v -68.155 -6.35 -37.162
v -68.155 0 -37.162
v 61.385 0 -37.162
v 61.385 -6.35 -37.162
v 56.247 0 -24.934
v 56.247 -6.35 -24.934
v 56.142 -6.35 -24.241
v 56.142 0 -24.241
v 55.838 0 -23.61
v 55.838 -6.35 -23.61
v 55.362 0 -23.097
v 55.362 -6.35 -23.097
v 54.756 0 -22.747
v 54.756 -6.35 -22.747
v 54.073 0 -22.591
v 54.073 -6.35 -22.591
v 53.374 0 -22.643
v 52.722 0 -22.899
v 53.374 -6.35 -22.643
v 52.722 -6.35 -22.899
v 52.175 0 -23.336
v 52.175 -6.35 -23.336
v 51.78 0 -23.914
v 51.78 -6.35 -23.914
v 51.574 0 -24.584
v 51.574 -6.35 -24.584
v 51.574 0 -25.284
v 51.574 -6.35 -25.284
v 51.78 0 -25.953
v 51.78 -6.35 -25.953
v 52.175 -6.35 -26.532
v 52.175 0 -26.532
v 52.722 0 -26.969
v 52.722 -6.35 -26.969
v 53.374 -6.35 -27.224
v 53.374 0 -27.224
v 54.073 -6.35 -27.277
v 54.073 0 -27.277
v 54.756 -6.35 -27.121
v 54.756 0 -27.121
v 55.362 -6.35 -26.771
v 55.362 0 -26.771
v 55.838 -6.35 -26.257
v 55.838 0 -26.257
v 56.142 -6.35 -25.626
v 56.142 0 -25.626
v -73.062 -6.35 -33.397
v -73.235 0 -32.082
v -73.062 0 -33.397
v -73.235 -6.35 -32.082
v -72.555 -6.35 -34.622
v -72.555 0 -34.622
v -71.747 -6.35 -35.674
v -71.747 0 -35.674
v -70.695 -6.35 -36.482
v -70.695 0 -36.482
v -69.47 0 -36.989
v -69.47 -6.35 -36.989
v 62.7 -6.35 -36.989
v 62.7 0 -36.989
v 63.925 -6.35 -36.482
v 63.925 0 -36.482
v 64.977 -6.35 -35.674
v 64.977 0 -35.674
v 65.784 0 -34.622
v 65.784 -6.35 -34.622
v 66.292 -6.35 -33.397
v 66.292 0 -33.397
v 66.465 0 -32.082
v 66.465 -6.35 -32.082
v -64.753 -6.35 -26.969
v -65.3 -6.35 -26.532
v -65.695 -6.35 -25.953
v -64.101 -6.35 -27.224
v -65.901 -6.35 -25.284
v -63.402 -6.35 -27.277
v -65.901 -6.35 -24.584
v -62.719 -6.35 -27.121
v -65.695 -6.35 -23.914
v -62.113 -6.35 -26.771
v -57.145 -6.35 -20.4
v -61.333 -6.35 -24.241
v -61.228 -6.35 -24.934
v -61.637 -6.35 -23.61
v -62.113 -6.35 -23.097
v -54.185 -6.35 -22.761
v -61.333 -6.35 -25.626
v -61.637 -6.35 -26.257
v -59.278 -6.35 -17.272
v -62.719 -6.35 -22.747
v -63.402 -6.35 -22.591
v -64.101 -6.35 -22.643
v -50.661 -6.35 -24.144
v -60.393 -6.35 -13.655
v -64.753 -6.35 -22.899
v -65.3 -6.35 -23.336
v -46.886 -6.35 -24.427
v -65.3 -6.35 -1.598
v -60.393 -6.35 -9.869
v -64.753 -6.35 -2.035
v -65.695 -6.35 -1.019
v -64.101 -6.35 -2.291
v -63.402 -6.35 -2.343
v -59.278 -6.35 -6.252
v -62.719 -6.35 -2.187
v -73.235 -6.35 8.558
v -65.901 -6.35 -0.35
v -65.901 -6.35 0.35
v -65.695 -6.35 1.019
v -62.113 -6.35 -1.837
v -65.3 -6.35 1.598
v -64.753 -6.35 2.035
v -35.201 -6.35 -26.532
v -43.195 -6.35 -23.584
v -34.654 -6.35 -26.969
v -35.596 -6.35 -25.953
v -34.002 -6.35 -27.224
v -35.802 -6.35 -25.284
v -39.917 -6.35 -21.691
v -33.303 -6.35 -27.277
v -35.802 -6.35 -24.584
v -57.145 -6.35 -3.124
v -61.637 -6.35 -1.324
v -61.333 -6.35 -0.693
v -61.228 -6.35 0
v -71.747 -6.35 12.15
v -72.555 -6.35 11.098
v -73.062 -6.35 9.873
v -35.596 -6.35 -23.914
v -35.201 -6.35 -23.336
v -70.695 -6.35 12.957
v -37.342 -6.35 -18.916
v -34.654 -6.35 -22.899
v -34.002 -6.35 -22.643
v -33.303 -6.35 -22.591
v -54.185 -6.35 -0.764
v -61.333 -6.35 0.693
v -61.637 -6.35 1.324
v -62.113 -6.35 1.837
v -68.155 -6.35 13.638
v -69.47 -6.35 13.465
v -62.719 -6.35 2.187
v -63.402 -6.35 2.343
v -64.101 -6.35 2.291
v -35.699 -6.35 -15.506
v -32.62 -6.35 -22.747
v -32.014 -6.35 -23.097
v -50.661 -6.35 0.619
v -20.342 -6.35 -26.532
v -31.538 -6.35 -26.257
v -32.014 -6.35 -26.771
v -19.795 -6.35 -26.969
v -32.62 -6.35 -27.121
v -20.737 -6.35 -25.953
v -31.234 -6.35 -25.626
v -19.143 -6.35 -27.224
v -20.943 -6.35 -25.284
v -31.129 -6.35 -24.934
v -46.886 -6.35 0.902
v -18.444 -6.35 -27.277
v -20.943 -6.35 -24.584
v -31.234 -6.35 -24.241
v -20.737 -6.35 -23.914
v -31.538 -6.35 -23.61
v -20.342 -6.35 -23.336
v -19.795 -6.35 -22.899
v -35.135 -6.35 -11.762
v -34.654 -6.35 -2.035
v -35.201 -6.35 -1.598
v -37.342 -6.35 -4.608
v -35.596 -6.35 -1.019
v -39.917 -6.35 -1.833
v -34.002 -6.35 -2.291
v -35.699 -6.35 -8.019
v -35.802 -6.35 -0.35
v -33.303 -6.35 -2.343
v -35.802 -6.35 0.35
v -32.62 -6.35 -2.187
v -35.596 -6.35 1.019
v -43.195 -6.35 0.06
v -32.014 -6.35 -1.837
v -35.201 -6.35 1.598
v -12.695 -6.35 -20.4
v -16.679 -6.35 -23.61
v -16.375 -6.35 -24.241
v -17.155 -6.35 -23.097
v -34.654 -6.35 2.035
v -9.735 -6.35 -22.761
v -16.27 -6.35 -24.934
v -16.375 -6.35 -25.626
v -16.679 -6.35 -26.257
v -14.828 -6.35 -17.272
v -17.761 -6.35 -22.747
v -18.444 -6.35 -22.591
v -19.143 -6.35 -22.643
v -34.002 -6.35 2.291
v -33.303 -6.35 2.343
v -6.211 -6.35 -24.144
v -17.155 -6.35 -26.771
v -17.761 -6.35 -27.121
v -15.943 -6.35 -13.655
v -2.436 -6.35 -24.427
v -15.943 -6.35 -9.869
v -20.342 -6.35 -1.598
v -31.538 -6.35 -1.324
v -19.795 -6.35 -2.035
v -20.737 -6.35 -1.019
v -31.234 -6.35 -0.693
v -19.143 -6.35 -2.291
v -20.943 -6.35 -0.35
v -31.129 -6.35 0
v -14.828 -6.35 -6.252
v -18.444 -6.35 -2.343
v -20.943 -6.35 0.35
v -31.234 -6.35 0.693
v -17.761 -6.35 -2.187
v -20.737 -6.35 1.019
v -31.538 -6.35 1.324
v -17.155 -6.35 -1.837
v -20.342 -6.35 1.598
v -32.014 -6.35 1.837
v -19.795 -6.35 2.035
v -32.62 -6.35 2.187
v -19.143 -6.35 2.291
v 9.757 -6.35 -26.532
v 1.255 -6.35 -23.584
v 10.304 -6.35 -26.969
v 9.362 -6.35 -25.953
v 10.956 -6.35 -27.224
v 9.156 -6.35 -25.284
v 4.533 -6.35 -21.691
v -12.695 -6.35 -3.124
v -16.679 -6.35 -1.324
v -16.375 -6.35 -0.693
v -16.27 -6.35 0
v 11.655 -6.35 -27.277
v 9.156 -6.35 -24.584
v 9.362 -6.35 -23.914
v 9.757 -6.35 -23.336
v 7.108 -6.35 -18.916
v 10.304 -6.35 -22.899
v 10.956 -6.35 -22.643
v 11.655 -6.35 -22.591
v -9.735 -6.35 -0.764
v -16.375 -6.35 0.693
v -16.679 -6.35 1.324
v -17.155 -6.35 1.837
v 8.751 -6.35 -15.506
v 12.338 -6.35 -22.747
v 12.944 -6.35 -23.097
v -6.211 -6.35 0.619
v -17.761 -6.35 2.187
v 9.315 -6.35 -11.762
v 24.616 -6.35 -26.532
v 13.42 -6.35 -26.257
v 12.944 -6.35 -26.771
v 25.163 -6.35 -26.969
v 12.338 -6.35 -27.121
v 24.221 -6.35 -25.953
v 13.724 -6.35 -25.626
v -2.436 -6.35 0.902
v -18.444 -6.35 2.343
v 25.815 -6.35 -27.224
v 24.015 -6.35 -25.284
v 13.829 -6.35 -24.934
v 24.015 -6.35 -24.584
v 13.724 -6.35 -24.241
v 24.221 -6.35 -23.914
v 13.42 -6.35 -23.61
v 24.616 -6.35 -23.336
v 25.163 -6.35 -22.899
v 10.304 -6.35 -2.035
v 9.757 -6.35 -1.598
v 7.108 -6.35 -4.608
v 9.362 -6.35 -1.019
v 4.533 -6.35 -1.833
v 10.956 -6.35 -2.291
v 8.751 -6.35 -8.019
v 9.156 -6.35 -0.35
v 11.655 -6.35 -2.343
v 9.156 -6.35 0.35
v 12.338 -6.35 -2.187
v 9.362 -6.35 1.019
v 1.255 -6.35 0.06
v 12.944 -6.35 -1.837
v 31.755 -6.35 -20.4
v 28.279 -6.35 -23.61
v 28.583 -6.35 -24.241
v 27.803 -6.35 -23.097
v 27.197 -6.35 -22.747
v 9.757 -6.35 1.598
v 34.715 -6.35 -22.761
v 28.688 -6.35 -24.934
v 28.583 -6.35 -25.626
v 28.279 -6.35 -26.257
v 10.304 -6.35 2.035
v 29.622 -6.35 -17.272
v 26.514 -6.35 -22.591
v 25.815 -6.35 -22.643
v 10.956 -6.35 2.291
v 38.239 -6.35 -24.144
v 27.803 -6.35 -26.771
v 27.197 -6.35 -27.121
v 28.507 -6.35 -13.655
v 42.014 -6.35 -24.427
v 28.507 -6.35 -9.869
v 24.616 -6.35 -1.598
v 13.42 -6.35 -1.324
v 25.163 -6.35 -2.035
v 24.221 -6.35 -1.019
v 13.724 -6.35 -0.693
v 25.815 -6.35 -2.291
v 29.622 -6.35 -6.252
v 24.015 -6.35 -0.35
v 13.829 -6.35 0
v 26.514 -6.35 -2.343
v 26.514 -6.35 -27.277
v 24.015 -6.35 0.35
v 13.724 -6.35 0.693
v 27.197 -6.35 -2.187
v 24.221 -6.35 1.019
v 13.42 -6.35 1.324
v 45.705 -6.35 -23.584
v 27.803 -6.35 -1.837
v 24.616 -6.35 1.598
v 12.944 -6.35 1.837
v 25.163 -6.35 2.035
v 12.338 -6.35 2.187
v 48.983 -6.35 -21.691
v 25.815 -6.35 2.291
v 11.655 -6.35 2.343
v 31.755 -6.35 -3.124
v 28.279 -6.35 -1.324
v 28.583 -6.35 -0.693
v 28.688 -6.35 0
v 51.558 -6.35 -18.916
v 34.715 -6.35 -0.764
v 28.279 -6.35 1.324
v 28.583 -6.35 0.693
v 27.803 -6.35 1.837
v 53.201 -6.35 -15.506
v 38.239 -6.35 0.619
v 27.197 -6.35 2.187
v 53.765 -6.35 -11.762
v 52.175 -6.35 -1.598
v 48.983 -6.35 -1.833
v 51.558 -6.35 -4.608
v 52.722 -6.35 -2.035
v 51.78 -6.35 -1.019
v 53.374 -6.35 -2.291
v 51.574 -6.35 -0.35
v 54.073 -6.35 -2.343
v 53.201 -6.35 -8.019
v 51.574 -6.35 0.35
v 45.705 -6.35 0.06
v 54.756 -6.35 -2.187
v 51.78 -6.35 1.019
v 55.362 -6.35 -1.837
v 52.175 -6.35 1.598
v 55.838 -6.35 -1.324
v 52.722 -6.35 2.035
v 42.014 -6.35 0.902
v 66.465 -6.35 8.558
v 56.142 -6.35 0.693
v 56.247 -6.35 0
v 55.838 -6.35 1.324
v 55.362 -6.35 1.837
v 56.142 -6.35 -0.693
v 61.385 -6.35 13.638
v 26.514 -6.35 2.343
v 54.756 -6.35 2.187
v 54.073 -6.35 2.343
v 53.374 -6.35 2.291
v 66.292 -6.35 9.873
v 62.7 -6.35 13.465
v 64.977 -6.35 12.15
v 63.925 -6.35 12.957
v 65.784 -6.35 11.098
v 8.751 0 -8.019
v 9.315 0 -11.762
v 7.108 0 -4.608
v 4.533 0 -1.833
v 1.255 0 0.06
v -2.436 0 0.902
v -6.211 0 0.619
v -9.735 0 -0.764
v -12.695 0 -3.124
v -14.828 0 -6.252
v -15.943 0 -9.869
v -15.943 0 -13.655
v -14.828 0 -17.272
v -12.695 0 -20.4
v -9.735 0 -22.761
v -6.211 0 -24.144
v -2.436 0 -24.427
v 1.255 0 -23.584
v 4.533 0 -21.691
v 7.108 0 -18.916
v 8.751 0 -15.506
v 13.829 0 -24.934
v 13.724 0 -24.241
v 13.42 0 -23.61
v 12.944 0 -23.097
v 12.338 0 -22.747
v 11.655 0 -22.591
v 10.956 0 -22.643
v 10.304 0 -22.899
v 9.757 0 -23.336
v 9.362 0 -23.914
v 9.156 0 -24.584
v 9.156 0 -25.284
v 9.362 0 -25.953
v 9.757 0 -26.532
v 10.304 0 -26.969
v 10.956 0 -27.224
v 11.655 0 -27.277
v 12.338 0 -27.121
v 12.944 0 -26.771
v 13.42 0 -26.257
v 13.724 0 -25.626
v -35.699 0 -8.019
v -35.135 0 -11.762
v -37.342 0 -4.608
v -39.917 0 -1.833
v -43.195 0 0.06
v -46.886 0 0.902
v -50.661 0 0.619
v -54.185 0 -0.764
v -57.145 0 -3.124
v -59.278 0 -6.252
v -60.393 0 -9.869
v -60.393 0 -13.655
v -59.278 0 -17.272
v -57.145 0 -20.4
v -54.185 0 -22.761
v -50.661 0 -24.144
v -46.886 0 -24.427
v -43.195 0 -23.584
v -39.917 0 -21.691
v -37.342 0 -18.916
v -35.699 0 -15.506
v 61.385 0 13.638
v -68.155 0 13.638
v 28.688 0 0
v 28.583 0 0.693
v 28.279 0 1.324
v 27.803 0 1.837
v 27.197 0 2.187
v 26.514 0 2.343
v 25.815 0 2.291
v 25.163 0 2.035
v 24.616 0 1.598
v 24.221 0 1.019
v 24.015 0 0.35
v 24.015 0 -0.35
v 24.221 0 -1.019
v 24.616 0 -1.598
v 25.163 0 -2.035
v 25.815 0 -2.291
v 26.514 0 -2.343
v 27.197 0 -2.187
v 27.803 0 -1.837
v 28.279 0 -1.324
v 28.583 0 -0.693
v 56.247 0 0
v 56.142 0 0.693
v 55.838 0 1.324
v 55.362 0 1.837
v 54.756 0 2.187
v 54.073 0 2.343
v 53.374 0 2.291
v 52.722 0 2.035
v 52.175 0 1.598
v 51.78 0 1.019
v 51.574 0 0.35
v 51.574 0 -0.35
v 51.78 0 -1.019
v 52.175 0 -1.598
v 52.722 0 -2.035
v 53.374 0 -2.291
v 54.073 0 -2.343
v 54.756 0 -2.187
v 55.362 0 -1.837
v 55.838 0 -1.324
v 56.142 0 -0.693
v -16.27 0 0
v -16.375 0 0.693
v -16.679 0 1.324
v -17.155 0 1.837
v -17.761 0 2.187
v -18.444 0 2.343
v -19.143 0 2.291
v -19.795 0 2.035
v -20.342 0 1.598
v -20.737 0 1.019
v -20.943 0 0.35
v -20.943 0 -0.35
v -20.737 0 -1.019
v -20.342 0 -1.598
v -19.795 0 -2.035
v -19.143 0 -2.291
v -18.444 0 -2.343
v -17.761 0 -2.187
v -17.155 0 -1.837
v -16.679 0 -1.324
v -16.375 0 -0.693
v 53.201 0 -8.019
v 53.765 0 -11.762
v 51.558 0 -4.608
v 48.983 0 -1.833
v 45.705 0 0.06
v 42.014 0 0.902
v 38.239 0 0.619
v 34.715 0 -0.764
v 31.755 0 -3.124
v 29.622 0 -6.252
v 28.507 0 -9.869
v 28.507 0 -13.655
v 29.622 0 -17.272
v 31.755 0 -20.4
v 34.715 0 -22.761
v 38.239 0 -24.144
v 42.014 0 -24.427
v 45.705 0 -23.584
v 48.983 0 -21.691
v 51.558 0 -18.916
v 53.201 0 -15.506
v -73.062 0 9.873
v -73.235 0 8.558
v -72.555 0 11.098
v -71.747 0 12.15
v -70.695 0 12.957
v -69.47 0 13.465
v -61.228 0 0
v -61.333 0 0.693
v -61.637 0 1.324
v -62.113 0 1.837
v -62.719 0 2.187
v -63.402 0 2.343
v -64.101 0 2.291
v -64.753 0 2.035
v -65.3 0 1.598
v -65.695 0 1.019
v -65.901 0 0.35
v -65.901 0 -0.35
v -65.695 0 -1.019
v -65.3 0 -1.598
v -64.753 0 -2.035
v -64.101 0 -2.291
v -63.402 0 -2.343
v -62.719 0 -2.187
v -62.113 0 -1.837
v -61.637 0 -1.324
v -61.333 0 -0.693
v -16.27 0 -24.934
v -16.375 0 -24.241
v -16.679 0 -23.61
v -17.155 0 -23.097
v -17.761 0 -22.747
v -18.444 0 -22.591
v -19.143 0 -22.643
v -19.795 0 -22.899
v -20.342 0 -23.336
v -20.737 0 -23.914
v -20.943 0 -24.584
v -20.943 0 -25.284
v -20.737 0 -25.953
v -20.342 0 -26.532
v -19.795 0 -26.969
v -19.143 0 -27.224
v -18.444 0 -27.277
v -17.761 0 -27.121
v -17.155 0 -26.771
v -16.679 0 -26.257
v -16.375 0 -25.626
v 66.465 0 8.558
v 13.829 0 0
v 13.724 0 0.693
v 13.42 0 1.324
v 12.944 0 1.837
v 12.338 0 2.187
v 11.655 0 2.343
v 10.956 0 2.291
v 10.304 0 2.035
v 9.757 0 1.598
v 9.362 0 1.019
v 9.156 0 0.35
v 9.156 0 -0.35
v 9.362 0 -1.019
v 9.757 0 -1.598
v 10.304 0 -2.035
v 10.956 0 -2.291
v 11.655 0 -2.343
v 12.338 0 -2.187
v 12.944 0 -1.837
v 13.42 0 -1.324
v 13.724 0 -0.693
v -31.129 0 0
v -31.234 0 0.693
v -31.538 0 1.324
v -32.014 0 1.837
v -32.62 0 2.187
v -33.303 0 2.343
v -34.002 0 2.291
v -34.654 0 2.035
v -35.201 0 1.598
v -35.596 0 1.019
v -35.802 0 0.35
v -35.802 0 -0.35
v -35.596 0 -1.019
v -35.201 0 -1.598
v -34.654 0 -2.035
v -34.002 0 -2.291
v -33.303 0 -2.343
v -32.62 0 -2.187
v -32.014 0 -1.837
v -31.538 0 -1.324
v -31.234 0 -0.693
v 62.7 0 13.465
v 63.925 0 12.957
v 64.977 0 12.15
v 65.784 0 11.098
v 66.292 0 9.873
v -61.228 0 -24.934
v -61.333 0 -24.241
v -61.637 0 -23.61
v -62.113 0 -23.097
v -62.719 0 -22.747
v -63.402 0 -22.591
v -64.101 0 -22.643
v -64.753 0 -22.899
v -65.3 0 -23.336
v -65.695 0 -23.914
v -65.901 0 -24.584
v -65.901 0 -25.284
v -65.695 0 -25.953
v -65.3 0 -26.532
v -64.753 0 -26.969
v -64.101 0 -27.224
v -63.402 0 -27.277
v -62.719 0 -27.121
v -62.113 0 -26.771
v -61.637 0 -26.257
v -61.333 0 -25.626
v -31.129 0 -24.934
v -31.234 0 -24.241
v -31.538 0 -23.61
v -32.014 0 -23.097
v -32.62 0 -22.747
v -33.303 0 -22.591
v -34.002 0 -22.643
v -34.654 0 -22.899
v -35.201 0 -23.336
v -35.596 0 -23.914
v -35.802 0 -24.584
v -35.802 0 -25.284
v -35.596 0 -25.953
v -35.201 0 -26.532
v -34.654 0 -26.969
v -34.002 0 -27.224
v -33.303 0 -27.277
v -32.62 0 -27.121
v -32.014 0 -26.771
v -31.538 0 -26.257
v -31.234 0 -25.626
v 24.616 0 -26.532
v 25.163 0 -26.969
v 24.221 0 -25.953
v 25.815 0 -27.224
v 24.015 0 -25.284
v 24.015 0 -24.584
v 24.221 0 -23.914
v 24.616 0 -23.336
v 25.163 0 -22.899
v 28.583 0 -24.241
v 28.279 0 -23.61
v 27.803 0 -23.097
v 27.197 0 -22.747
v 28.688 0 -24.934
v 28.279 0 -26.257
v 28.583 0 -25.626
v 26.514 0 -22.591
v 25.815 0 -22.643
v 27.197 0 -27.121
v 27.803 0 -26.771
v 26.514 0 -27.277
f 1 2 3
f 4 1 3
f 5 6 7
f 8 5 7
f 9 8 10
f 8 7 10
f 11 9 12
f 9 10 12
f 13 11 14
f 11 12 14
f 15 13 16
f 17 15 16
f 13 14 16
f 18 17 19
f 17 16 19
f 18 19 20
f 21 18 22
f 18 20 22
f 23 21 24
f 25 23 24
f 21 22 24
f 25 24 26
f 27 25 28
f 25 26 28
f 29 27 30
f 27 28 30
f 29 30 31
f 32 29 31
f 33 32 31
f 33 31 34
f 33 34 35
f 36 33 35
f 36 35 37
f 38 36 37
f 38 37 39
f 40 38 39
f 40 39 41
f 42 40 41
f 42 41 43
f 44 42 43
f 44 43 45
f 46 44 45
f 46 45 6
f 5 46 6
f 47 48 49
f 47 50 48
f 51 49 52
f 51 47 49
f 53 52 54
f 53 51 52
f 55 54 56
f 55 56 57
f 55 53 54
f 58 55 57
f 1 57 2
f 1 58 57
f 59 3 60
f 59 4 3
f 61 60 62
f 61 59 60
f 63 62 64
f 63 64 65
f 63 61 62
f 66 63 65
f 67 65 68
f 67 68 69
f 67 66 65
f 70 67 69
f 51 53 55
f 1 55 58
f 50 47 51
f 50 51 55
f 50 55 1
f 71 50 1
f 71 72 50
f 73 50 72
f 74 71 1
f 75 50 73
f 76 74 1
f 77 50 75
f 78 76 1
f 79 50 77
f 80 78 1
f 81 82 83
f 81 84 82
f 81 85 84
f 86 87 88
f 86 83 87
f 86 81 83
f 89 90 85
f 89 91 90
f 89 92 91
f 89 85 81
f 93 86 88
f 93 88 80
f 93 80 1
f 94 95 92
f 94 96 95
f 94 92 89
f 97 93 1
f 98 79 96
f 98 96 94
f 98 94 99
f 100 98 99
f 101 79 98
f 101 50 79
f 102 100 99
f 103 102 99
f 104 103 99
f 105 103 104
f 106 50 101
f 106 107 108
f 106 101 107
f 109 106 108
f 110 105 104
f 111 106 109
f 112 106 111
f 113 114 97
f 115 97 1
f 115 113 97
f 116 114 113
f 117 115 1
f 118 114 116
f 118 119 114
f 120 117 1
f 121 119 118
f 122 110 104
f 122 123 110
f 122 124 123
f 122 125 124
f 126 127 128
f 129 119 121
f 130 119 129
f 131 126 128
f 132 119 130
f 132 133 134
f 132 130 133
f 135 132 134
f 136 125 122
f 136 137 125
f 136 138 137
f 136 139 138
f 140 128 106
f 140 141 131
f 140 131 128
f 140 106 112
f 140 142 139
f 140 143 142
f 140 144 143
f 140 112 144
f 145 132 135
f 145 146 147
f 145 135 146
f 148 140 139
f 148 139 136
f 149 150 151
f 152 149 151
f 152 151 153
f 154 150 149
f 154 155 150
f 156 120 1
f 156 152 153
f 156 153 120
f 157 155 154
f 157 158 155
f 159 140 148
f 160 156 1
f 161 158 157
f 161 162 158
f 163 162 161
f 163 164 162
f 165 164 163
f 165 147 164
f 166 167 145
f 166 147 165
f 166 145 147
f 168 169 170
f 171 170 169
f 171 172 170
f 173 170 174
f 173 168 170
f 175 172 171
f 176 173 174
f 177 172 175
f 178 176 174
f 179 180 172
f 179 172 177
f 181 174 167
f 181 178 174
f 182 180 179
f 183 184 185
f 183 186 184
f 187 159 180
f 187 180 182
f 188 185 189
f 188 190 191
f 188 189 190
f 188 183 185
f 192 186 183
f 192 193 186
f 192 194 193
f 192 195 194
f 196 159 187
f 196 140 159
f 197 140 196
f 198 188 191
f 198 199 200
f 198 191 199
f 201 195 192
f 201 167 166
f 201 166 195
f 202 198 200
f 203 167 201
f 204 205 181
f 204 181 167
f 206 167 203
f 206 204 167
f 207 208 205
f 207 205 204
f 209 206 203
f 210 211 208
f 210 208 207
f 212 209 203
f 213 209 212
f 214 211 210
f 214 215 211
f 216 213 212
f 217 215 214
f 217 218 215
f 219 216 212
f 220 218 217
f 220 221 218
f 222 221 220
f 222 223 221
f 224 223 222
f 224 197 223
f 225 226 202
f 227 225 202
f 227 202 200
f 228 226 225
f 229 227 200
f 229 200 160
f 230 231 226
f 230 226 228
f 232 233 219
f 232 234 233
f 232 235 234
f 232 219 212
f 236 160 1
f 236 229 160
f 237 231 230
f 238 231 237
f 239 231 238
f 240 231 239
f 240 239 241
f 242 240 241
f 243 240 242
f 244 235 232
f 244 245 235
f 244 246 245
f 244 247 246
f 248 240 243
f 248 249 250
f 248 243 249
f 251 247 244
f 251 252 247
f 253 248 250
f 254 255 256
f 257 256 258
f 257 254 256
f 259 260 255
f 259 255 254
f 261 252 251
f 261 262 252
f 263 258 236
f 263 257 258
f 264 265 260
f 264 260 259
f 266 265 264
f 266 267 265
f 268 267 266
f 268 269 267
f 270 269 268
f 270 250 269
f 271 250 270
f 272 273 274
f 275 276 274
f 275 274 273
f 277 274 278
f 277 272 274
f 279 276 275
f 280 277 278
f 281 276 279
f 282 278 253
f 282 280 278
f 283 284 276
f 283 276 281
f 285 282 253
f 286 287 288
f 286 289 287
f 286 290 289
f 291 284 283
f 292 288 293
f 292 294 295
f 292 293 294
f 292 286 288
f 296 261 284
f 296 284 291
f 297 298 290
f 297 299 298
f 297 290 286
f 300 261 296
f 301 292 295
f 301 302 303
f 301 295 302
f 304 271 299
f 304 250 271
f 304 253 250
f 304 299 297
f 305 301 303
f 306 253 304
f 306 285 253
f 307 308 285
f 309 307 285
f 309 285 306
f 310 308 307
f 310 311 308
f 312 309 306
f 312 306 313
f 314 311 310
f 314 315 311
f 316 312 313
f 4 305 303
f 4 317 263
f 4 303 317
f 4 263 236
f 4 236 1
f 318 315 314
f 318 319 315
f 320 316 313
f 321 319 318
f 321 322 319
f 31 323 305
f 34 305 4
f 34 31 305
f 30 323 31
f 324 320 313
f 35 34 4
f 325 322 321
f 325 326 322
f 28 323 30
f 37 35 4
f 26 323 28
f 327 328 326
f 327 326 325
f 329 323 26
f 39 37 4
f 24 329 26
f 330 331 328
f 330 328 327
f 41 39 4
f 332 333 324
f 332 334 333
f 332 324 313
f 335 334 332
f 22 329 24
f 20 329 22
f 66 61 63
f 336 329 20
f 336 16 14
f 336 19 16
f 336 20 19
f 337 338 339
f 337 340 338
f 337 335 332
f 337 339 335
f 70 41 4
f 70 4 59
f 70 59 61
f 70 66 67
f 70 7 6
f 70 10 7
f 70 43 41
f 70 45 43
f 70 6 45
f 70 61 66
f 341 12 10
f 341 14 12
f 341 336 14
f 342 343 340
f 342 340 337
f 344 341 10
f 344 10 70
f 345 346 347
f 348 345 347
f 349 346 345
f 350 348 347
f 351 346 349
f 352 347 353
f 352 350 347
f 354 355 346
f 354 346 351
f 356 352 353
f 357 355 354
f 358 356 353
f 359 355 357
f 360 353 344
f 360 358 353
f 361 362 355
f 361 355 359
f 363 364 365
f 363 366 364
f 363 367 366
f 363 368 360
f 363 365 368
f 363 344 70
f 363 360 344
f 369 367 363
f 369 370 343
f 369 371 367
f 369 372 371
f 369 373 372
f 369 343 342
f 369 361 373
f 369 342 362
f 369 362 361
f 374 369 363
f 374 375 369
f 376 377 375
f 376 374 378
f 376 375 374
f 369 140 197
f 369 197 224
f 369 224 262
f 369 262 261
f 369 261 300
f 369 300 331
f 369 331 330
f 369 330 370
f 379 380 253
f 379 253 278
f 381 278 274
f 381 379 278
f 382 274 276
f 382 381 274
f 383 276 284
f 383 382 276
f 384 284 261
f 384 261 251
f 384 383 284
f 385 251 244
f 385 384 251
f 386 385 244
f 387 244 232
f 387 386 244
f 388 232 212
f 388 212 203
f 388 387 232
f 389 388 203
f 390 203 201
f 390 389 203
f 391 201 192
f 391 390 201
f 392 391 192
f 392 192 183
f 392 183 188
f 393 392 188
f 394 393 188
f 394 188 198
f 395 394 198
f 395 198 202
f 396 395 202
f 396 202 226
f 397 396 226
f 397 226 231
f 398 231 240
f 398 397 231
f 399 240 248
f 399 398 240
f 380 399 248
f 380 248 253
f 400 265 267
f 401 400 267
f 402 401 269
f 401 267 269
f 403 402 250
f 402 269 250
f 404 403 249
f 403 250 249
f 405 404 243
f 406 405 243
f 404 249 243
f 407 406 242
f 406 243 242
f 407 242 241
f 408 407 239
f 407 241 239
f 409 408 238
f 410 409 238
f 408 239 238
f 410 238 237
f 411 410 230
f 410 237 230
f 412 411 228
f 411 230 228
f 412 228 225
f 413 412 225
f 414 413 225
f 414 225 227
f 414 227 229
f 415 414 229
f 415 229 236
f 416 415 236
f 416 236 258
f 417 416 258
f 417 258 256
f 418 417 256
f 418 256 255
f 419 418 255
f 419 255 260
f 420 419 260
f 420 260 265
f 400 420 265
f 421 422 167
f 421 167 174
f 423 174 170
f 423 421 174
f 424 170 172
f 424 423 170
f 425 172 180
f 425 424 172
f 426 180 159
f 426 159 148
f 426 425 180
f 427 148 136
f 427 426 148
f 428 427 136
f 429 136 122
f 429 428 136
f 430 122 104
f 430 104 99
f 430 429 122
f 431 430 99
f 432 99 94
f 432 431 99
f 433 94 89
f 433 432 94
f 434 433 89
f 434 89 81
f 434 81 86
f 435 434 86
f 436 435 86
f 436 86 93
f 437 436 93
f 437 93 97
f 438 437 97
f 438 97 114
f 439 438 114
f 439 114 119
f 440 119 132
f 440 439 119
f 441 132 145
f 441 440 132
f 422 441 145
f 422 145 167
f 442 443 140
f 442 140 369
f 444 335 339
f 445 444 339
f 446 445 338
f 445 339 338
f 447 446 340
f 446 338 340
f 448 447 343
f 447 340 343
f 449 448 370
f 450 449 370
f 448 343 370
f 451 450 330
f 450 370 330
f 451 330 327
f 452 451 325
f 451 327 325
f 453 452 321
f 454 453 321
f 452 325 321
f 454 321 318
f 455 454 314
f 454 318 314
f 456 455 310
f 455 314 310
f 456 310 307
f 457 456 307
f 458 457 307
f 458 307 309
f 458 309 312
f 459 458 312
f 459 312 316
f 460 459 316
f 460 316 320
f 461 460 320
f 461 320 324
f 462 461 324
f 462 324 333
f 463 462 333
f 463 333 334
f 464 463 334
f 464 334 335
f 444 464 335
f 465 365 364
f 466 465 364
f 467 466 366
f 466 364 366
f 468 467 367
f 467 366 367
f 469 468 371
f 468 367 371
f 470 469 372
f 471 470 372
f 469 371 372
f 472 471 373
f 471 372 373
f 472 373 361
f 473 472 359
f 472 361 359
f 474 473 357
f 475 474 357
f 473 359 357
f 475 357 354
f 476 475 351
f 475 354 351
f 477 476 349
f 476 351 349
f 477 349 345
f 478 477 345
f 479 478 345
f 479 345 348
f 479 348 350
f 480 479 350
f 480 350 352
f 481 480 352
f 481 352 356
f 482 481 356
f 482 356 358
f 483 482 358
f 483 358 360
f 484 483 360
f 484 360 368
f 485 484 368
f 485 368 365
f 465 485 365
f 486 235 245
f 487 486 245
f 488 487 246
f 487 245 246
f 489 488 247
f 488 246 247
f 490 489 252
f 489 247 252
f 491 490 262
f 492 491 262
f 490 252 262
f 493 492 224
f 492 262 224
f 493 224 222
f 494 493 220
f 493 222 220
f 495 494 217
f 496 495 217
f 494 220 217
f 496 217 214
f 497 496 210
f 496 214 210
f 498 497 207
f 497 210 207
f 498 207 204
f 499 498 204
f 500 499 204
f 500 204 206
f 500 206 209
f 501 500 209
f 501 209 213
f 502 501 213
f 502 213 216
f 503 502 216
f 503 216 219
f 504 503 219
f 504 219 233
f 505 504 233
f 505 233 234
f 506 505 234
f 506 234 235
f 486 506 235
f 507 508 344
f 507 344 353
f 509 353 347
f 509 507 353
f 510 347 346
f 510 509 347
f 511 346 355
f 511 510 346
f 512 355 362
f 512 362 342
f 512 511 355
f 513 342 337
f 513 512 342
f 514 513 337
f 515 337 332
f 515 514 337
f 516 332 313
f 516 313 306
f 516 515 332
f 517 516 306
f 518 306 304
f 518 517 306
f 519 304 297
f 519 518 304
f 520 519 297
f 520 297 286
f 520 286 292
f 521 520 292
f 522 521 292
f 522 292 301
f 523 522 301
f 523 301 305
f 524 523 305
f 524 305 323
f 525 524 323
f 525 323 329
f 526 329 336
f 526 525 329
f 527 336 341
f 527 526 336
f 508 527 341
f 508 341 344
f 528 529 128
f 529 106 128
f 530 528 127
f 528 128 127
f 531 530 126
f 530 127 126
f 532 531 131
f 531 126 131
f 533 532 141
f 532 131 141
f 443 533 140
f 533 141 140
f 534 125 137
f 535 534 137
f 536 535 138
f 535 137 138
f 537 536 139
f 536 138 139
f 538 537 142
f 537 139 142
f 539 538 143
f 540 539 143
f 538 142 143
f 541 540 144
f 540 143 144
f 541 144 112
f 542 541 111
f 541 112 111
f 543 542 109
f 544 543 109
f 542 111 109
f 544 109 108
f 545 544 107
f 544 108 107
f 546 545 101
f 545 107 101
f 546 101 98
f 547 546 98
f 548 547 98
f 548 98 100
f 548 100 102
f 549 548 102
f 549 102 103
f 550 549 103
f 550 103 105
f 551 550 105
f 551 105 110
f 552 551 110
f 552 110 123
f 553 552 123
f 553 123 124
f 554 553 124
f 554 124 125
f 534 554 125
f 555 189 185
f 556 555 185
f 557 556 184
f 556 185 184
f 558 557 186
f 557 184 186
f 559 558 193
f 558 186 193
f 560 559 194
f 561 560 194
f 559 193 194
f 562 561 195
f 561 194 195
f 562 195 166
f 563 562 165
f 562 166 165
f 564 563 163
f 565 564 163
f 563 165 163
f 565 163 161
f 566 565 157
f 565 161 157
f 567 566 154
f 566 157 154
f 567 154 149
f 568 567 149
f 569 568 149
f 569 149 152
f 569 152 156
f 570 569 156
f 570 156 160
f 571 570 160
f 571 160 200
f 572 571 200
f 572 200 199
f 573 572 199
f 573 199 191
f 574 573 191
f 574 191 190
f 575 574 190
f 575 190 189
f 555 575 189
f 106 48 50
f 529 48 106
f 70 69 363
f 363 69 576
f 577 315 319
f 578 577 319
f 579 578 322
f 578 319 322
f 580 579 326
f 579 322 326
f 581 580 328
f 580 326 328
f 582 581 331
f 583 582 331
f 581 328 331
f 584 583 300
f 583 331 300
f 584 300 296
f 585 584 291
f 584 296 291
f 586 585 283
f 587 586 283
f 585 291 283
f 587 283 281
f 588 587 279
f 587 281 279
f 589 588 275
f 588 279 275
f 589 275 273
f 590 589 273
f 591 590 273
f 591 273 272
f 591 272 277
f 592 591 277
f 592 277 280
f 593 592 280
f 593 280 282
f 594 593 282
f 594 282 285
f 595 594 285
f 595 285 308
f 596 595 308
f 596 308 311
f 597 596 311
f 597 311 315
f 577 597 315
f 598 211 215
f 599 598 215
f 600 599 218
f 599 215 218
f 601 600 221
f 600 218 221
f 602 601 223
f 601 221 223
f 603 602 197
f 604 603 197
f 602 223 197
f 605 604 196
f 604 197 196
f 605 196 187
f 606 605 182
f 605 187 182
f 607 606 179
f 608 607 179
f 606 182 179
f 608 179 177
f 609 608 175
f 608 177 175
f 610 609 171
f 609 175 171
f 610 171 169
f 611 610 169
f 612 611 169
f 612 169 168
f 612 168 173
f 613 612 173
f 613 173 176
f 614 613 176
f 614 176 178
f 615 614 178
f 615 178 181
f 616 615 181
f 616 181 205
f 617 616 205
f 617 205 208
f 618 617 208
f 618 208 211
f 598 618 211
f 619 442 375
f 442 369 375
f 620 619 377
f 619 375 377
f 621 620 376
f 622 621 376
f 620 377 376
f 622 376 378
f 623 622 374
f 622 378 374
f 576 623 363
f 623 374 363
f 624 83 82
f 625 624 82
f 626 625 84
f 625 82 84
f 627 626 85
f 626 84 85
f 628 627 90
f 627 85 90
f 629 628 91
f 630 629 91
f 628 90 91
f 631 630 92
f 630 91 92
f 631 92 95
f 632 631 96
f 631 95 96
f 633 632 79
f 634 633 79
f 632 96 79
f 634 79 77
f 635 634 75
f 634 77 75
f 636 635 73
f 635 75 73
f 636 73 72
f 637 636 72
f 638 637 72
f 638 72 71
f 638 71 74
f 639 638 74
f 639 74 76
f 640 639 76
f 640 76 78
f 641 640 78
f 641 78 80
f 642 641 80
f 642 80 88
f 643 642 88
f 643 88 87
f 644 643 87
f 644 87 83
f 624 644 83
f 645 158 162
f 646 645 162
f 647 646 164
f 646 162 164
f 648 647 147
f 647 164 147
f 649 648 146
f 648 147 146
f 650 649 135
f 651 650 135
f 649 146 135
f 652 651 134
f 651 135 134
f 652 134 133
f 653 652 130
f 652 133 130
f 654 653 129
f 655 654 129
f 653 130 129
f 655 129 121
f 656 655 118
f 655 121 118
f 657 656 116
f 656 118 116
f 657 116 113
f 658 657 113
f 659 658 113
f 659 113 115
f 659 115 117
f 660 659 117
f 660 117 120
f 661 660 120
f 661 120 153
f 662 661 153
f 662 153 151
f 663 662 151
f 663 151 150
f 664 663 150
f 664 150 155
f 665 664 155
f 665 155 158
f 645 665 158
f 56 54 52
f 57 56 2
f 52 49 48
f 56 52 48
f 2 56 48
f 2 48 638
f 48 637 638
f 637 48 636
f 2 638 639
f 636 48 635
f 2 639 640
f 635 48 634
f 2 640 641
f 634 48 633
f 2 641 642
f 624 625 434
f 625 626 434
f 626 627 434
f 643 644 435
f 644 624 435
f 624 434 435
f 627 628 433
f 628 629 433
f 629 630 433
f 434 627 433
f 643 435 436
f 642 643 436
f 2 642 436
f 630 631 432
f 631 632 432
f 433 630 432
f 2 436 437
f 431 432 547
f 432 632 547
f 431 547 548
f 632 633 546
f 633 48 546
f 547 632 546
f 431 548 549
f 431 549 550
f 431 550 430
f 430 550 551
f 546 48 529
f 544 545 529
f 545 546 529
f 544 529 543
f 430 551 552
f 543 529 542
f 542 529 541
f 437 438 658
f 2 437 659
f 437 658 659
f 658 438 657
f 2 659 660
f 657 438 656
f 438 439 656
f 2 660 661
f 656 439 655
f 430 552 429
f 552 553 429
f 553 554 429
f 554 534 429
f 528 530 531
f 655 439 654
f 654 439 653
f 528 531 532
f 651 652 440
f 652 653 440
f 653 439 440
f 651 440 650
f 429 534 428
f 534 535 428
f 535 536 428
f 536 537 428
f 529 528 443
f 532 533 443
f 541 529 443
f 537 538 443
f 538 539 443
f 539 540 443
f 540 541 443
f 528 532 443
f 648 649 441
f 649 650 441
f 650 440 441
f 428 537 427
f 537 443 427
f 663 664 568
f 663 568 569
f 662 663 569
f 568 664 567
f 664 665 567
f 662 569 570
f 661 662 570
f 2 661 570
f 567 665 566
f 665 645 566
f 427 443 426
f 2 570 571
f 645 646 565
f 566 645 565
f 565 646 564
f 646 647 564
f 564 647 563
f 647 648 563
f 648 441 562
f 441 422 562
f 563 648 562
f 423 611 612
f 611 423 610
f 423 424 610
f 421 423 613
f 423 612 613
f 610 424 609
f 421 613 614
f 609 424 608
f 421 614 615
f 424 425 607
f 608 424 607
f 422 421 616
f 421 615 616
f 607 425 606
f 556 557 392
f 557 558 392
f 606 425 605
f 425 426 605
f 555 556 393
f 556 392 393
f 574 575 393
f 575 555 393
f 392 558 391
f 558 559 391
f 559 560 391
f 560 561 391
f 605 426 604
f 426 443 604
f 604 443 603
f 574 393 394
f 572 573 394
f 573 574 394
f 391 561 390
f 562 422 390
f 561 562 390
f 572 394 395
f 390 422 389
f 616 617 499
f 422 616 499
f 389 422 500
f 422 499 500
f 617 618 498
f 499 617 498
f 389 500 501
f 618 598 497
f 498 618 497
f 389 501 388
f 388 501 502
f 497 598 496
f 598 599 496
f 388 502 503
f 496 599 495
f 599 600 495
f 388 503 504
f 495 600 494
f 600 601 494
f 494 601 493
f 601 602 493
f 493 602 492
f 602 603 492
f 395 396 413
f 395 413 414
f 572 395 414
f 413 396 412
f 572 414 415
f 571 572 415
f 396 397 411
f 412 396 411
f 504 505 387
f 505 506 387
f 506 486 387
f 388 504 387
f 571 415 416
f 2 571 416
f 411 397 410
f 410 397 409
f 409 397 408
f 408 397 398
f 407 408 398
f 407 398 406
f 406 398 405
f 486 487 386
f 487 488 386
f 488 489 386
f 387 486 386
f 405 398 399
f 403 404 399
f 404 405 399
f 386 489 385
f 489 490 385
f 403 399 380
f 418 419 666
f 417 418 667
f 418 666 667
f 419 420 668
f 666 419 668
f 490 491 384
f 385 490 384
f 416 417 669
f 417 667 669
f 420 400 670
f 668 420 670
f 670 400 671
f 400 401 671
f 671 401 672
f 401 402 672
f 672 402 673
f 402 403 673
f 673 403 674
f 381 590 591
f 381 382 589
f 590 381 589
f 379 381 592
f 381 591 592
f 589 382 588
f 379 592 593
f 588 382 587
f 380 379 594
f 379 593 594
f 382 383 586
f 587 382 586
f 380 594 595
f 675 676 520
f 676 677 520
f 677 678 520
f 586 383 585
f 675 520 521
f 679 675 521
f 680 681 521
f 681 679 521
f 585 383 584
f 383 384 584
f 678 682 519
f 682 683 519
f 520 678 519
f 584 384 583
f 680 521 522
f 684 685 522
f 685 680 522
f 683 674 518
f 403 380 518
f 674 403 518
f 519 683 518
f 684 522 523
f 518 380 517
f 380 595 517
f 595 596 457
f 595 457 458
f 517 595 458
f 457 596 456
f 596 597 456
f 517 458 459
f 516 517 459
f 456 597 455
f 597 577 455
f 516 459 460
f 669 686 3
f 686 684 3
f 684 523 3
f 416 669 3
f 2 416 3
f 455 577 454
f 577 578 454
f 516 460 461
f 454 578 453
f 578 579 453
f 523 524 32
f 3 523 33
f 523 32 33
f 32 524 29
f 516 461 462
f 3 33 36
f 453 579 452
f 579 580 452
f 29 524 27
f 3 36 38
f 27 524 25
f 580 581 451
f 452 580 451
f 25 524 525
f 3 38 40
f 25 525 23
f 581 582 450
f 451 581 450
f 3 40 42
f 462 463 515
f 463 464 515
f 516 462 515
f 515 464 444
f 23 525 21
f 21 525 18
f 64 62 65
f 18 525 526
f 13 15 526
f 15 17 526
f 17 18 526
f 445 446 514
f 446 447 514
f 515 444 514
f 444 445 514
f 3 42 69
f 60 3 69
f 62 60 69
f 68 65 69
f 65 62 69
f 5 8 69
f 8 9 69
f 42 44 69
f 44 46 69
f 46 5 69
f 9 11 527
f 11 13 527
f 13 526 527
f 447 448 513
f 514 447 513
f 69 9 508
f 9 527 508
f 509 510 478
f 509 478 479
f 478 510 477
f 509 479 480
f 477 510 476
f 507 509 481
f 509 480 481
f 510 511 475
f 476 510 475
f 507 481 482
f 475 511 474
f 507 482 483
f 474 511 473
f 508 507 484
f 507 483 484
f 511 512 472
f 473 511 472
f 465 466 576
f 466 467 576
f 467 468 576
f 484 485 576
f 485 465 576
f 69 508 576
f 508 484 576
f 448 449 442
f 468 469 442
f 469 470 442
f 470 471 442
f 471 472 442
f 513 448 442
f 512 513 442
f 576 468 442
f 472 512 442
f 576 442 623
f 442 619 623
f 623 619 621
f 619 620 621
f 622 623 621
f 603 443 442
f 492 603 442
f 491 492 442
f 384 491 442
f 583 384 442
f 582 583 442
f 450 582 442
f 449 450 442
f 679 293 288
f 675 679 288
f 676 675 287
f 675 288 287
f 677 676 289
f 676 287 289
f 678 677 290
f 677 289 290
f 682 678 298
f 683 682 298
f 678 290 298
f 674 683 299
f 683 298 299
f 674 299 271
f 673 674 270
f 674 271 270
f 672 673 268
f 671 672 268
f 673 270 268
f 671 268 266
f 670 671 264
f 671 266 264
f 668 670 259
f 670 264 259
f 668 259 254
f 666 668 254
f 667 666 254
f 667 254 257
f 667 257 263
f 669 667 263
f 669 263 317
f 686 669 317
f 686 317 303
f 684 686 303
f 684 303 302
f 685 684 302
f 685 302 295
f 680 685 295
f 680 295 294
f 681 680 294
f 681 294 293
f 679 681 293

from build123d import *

# Parameters (mm, degrees)
F0_W          = 139.7
F0_H          = 50.8
F0_R          = 12.7
F1_DEPTH      = 6.35
F2_R          = 5.08
F3_R          = 2.3495
F4_DEPTH      = 25.4
F4_DEPTH_BACK = 25.4


with BuildPart() as f1:
    # F0 (on Front) → F1 (new body)
    with BuildSketch(Plane.XZ):
        with Locations((-3.385224, -11.762154)):
            Rectangle(F0_W, F0_H)
        with Locations((-47.835224, -11.762154)):
            Circle(F0_R, mode=Mode.SUBTRACT)
        with Locations((-3.385224, -11.762154)):
            Circle(F0_R, mode=Mode.SUBTRACT)
        with Locations((41.064776, -11.762154)):
            Circle(F0_R, mode=Mode.SUBTRACT)
    extrude(amount=F1_DEPTH)

    # F2
    f2_edges = [f1.edges().sort_by_distance(p)[0] for p in [
        (-73.235224, -3.175, 13.637846),
        (66.464776, -3.175, 13.637846),
        (66.464776, -3.175, -37.162154),
        (-73.235224, -3.175, -37.162154),
    ]]
    fillet(f2_edges, radius=F2_R)

    # F3 (on face) → F4 (cut, two sides)
    with BuildSketch(Plane.XZ.offset(6.35)) as f4_sk:
        with Locations((-63.577805, 0)):
            Circle(F3_R)
        with Locations((-33.478805, 0)):
            Circle(F3_R)
        with Locations((-63.577805, -24.933804)):
            Circle(F3_R)
        with Locations((-33.478805, -24.933804)):
            Circle(F3_R)
        with Locations((-18.619805, 0)):
            Circle(F3_R)
        with Locations((11.479195, 0)):
            Circle(F3_R)
        with Locations((-18.619805, -24.933804)):
            Circle(F3_R)
        with Locations((11.479195, -24.933804)):
            Circle(F3_R)
        with Locations((26.338195, 0)):
            Circle(F3_R)
        with Locations((53.897195, 0)):
            Circle(F3_R)
        with Locations((26.338195, -24.933804)):
            Circle(F3_R)
        with Locations((53.897195, -24.933804)):
            Circle(F3_R)
    extrude(amount=-F4_DEPTH, mode=Mode.SUBTRACT)
    extrude(f4_sk.sketch, amount=-F4_DEPTH_BACK, mode=Mode.SUBTRACT)


solid = f1.part
